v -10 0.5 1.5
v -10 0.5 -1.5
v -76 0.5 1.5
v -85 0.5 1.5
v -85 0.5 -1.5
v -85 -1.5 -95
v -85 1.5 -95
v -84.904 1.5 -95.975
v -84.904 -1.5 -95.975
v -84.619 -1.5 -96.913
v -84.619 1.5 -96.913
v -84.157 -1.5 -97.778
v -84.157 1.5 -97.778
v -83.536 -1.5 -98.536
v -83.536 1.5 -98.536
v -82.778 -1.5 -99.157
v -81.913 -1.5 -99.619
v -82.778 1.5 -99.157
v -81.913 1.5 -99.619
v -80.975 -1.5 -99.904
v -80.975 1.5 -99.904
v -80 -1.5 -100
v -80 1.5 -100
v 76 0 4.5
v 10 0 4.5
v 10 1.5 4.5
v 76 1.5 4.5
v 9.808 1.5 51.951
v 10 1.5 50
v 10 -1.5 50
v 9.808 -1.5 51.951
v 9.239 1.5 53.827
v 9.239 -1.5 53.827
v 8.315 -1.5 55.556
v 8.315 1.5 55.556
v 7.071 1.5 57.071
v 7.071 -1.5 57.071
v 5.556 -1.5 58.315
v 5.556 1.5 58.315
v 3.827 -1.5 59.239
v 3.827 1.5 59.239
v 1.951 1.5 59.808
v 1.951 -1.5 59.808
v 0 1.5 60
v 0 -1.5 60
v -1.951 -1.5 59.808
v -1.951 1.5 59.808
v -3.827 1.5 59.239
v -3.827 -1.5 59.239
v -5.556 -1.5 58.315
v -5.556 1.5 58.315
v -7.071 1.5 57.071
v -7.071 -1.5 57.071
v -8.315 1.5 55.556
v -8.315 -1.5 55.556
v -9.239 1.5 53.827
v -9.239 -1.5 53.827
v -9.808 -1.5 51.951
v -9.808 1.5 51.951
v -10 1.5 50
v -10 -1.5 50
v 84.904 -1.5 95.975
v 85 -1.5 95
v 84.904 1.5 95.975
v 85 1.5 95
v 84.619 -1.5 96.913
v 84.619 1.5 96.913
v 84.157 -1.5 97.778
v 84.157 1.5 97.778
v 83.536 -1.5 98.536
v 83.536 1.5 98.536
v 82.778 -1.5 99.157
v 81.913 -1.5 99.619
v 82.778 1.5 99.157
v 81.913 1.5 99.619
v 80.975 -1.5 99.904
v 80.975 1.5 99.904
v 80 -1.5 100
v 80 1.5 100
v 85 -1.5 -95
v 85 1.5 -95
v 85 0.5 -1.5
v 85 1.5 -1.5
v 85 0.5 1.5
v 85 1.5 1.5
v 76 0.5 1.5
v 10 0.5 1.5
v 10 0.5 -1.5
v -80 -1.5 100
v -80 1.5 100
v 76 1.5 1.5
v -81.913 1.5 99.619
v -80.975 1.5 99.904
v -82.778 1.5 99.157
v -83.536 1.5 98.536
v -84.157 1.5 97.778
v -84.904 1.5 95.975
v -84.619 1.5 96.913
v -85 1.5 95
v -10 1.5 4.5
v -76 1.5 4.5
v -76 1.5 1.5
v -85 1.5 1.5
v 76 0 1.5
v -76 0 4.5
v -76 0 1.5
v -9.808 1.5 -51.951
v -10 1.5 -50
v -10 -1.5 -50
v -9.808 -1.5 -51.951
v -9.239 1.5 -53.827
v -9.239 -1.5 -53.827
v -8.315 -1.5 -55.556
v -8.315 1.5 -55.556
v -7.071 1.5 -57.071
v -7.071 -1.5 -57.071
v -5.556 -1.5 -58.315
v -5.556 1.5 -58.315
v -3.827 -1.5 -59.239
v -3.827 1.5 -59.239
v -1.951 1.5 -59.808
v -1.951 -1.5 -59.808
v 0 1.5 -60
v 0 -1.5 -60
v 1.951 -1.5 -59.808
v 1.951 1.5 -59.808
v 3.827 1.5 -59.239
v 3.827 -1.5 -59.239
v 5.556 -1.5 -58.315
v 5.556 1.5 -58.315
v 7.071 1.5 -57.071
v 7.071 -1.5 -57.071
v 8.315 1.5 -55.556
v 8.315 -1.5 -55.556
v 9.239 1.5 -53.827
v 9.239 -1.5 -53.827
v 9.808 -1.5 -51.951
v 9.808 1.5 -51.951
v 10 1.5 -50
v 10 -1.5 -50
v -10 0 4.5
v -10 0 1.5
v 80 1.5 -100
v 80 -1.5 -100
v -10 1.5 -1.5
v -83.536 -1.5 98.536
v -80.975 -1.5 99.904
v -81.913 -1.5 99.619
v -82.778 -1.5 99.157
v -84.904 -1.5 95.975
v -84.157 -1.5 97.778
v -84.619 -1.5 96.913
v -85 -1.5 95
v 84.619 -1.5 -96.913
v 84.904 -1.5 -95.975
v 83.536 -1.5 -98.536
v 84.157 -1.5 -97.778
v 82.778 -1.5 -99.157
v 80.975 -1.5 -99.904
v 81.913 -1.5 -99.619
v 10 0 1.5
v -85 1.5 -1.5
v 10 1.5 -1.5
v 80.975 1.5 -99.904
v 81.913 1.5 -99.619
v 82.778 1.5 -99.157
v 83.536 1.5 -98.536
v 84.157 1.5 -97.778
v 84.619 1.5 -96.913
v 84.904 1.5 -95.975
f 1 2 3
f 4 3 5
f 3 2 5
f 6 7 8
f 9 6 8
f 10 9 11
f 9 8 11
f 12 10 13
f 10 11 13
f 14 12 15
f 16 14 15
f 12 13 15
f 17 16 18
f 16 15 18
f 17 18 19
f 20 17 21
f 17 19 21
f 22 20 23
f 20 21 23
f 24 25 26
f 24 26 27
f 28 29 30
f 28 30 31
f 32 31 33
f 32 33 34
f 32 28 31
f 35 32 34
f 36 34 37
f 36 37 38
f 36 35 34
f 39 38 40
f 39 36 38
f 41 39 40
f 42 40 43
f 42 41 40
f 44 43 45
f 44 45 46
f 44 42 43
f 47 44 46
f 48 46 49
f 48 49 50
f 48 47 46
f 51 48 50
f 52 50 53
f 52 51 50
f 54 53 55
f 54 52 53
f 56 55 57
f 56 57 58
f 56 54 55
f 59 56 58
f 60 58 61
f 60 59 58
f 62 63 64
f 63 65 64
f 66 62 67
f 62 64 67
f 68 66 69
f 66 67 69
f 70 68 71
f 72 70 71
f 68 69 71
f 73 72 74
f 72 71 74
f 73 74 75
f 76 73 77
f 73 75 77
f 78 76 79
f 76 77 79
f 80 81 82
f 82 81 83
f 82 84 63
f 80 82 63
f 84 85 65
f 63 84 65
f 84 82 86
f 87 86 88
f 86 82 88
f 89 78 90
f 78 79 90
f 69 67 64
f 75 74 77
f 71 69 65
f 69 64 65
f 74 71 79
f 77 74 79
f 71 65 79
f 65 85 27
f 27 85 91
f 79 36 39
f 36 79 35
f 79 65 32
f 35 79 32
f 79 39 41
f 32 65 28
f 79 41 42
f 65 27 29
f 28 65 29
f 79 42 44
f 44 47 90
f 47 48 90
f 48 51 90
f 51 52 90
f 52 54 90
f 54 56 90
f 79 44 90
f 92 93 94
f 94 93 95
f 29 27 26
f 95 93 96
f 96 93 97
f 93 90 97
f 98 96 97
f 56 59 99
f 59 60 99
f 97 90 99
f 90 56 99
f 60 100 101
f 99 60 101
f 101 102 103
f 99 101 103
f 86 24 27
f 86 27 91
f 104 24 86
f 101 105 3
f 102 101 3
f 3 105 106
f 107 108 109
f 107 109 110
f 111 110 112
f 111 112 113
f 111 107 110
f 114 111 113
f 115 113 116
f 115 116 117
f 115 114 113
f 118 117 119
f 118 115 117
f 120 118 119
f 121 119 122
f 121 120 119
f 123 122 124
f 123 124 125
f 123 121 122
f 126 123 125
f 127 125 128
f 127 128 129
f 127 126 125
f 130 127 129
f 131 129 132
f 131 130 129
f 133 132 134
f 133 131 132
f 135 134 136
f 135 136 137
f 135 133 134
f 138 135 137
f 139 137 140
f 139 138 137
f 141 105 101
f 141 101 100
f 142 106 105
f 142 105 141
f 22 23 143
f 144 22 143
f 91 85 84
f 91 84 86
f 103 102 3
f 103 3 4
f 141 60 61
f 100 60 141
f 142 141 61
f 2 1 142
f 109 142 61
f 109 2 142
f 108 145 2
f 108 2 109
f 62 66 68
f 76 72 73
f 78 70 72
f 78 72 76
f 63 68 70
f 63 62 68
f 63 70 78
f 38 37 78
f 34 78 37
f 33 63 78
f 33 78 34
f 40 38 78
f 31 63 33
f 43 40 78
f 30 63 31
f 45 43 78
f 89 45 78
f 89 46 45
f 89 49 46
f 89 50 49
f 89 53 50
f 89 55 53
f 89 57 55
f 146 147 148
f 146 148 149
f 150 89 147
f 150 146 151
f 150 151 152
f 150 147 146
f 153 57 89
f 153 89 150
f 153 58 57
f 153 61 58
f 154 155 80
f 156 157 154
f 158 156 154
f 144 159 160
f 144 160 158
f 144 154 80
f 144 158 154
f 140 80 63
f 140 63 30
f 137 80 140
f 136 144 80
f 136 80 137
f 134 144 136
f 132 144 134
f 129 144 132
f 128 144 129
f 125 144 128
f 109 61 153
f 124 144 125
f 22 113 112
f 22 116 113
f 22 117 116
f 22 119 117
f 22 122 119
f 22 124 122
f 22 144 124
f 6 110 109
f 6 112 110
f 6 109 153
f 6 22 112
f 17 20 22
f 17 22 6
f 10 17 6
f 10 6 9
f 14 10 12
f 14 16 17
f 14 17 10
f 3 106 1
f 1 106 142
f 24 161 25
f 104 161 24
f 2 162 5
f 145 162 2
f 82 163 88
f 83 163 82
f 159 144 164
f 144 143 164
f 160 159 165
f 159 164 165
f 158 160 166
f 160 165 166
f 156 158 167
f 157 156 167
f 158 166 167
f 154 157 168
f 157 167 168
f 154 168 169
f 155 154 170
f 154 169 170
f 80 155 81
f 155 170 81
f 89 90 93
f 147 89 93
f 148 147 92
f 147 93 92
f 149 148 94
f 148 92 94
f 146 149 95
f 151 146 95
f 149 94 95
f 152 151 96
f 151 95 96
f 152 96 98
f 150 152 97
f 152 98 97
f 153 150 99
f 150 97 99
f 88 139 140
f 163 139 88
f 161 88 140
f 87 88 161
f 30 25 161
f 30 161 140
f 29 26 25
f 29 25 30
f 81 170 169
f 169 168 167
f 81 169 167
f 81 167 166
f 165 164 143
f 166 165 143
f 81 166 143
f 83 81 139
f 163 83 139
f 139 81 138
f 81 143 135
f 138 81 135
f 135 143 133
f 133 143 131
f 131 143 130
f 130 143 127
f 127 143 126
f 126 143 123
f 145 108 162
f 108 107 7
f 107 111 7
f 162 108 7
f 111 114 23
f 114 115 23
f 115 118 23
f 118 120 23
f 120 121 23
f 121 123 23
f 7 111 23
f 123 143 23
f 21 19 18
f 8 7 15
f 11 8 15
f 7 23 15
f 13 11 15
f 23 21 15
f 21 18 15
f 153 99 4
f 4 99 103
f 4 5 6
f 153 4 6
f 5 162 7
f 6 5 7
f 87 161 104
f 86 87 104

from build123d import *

# Parameters (mm, degrees)
EXTRUDE_1_DEPTH          = 1.5
CUT_EXTRUDE_1_DEPTH      = 132.278330276
CUT_EXTRUDE_1_DEPTH_BACK = 1.5
SKETCH_3_W               = 152
SKETCH_3_H               = 3
CUT_EXTRUDE_2_DEPTH      = 1


with BuildPart() as part:
    # Эскиз1 → Бобышка-Вытянуть1 (new, symmetric)
    with BuildSketch(Plane(origin=(0, 0, 0), x_dir=(1, 0, 0), z_dir=(0, 1, 0))):
        with BuildLine():
            Line((-80, 100), (80, 100))
            ThreePointArc((80, 100), (83.535533906, 98.535533906), (85, 95))
            Line((85, 95), (85, -95))
            ThreePointArc((85, -95), (83.535533906, -98.535533906), (80, -100))
            Line((80, -100), (-80, -100))
            ThreePointArc((-80, -100), (-83.535533906, -98.535533906), (-85, -95))
            Line((-85, -95), (-85, 95))
            ThreePointArc((-85, 95), (-83.535533906, 98.535533906), (-80, 100))
        make_face()
        with BuildLine():
            Line((10, 50), (10, -50))
            ThreePointArc((10, -50), (0, -60), (-10, -50))
            Line((-10, -50), (-10, 50))
            ThreePointArc((-10, 50), (0, 60), (10, 50))
        make_face(mode=Mode.SUBTRACT)
    extrude(amount=EXTRUDE_1_DEPTH, both=True)

    # Эскиз3 → Вырез-Вытянуть1 (cut, two sides: drawn at the far end of the back side and taken through both)
    with BuildSketch(Plane(origin=(0, 1.5, 0), x_dir=(1, 0, 0), z_dir=(0, 1, 0)).offset(-CUT_EXTRUDE_1_DEPTH_BACK)):
        with Locations((0, -3)):
            Rectangle(SKETCH_3_W, SKETCH_3_H)
    extrude(amount=CUT_EXTRUDE_1_DEPTH + CUT_EXTRUDE_1_DEPTH_BACK, mode=Mode.SUBTRACT)

    # Эскиз4 → Вырез-Вытянуть2 (cut)
    with BuildSketch(Plane(origin=(0, 1.5, 0), x_dir=(1, 0, 0), z_dir=(0, 1, 0))):
        with BuildLine():
            Line((88.228937258, -1.5), (-88.228937258, -1.5))
            ThreePointArc((-88.228937258, -1.5), (-89.728937258, 0), (-88.228937258, 1.5))
            Line((-88.228937258, 1.5), (88.228937258, 1.5))
            ThreePointArc((88.228937258, 1.5), (89.728937258, 0), (88.228937258, -1.5))
        make_face()
    extrude(amount=-CUT_EXTRUDE_2_DEPTH, mode=Mode.SUBTRACT)


solid = part.part
